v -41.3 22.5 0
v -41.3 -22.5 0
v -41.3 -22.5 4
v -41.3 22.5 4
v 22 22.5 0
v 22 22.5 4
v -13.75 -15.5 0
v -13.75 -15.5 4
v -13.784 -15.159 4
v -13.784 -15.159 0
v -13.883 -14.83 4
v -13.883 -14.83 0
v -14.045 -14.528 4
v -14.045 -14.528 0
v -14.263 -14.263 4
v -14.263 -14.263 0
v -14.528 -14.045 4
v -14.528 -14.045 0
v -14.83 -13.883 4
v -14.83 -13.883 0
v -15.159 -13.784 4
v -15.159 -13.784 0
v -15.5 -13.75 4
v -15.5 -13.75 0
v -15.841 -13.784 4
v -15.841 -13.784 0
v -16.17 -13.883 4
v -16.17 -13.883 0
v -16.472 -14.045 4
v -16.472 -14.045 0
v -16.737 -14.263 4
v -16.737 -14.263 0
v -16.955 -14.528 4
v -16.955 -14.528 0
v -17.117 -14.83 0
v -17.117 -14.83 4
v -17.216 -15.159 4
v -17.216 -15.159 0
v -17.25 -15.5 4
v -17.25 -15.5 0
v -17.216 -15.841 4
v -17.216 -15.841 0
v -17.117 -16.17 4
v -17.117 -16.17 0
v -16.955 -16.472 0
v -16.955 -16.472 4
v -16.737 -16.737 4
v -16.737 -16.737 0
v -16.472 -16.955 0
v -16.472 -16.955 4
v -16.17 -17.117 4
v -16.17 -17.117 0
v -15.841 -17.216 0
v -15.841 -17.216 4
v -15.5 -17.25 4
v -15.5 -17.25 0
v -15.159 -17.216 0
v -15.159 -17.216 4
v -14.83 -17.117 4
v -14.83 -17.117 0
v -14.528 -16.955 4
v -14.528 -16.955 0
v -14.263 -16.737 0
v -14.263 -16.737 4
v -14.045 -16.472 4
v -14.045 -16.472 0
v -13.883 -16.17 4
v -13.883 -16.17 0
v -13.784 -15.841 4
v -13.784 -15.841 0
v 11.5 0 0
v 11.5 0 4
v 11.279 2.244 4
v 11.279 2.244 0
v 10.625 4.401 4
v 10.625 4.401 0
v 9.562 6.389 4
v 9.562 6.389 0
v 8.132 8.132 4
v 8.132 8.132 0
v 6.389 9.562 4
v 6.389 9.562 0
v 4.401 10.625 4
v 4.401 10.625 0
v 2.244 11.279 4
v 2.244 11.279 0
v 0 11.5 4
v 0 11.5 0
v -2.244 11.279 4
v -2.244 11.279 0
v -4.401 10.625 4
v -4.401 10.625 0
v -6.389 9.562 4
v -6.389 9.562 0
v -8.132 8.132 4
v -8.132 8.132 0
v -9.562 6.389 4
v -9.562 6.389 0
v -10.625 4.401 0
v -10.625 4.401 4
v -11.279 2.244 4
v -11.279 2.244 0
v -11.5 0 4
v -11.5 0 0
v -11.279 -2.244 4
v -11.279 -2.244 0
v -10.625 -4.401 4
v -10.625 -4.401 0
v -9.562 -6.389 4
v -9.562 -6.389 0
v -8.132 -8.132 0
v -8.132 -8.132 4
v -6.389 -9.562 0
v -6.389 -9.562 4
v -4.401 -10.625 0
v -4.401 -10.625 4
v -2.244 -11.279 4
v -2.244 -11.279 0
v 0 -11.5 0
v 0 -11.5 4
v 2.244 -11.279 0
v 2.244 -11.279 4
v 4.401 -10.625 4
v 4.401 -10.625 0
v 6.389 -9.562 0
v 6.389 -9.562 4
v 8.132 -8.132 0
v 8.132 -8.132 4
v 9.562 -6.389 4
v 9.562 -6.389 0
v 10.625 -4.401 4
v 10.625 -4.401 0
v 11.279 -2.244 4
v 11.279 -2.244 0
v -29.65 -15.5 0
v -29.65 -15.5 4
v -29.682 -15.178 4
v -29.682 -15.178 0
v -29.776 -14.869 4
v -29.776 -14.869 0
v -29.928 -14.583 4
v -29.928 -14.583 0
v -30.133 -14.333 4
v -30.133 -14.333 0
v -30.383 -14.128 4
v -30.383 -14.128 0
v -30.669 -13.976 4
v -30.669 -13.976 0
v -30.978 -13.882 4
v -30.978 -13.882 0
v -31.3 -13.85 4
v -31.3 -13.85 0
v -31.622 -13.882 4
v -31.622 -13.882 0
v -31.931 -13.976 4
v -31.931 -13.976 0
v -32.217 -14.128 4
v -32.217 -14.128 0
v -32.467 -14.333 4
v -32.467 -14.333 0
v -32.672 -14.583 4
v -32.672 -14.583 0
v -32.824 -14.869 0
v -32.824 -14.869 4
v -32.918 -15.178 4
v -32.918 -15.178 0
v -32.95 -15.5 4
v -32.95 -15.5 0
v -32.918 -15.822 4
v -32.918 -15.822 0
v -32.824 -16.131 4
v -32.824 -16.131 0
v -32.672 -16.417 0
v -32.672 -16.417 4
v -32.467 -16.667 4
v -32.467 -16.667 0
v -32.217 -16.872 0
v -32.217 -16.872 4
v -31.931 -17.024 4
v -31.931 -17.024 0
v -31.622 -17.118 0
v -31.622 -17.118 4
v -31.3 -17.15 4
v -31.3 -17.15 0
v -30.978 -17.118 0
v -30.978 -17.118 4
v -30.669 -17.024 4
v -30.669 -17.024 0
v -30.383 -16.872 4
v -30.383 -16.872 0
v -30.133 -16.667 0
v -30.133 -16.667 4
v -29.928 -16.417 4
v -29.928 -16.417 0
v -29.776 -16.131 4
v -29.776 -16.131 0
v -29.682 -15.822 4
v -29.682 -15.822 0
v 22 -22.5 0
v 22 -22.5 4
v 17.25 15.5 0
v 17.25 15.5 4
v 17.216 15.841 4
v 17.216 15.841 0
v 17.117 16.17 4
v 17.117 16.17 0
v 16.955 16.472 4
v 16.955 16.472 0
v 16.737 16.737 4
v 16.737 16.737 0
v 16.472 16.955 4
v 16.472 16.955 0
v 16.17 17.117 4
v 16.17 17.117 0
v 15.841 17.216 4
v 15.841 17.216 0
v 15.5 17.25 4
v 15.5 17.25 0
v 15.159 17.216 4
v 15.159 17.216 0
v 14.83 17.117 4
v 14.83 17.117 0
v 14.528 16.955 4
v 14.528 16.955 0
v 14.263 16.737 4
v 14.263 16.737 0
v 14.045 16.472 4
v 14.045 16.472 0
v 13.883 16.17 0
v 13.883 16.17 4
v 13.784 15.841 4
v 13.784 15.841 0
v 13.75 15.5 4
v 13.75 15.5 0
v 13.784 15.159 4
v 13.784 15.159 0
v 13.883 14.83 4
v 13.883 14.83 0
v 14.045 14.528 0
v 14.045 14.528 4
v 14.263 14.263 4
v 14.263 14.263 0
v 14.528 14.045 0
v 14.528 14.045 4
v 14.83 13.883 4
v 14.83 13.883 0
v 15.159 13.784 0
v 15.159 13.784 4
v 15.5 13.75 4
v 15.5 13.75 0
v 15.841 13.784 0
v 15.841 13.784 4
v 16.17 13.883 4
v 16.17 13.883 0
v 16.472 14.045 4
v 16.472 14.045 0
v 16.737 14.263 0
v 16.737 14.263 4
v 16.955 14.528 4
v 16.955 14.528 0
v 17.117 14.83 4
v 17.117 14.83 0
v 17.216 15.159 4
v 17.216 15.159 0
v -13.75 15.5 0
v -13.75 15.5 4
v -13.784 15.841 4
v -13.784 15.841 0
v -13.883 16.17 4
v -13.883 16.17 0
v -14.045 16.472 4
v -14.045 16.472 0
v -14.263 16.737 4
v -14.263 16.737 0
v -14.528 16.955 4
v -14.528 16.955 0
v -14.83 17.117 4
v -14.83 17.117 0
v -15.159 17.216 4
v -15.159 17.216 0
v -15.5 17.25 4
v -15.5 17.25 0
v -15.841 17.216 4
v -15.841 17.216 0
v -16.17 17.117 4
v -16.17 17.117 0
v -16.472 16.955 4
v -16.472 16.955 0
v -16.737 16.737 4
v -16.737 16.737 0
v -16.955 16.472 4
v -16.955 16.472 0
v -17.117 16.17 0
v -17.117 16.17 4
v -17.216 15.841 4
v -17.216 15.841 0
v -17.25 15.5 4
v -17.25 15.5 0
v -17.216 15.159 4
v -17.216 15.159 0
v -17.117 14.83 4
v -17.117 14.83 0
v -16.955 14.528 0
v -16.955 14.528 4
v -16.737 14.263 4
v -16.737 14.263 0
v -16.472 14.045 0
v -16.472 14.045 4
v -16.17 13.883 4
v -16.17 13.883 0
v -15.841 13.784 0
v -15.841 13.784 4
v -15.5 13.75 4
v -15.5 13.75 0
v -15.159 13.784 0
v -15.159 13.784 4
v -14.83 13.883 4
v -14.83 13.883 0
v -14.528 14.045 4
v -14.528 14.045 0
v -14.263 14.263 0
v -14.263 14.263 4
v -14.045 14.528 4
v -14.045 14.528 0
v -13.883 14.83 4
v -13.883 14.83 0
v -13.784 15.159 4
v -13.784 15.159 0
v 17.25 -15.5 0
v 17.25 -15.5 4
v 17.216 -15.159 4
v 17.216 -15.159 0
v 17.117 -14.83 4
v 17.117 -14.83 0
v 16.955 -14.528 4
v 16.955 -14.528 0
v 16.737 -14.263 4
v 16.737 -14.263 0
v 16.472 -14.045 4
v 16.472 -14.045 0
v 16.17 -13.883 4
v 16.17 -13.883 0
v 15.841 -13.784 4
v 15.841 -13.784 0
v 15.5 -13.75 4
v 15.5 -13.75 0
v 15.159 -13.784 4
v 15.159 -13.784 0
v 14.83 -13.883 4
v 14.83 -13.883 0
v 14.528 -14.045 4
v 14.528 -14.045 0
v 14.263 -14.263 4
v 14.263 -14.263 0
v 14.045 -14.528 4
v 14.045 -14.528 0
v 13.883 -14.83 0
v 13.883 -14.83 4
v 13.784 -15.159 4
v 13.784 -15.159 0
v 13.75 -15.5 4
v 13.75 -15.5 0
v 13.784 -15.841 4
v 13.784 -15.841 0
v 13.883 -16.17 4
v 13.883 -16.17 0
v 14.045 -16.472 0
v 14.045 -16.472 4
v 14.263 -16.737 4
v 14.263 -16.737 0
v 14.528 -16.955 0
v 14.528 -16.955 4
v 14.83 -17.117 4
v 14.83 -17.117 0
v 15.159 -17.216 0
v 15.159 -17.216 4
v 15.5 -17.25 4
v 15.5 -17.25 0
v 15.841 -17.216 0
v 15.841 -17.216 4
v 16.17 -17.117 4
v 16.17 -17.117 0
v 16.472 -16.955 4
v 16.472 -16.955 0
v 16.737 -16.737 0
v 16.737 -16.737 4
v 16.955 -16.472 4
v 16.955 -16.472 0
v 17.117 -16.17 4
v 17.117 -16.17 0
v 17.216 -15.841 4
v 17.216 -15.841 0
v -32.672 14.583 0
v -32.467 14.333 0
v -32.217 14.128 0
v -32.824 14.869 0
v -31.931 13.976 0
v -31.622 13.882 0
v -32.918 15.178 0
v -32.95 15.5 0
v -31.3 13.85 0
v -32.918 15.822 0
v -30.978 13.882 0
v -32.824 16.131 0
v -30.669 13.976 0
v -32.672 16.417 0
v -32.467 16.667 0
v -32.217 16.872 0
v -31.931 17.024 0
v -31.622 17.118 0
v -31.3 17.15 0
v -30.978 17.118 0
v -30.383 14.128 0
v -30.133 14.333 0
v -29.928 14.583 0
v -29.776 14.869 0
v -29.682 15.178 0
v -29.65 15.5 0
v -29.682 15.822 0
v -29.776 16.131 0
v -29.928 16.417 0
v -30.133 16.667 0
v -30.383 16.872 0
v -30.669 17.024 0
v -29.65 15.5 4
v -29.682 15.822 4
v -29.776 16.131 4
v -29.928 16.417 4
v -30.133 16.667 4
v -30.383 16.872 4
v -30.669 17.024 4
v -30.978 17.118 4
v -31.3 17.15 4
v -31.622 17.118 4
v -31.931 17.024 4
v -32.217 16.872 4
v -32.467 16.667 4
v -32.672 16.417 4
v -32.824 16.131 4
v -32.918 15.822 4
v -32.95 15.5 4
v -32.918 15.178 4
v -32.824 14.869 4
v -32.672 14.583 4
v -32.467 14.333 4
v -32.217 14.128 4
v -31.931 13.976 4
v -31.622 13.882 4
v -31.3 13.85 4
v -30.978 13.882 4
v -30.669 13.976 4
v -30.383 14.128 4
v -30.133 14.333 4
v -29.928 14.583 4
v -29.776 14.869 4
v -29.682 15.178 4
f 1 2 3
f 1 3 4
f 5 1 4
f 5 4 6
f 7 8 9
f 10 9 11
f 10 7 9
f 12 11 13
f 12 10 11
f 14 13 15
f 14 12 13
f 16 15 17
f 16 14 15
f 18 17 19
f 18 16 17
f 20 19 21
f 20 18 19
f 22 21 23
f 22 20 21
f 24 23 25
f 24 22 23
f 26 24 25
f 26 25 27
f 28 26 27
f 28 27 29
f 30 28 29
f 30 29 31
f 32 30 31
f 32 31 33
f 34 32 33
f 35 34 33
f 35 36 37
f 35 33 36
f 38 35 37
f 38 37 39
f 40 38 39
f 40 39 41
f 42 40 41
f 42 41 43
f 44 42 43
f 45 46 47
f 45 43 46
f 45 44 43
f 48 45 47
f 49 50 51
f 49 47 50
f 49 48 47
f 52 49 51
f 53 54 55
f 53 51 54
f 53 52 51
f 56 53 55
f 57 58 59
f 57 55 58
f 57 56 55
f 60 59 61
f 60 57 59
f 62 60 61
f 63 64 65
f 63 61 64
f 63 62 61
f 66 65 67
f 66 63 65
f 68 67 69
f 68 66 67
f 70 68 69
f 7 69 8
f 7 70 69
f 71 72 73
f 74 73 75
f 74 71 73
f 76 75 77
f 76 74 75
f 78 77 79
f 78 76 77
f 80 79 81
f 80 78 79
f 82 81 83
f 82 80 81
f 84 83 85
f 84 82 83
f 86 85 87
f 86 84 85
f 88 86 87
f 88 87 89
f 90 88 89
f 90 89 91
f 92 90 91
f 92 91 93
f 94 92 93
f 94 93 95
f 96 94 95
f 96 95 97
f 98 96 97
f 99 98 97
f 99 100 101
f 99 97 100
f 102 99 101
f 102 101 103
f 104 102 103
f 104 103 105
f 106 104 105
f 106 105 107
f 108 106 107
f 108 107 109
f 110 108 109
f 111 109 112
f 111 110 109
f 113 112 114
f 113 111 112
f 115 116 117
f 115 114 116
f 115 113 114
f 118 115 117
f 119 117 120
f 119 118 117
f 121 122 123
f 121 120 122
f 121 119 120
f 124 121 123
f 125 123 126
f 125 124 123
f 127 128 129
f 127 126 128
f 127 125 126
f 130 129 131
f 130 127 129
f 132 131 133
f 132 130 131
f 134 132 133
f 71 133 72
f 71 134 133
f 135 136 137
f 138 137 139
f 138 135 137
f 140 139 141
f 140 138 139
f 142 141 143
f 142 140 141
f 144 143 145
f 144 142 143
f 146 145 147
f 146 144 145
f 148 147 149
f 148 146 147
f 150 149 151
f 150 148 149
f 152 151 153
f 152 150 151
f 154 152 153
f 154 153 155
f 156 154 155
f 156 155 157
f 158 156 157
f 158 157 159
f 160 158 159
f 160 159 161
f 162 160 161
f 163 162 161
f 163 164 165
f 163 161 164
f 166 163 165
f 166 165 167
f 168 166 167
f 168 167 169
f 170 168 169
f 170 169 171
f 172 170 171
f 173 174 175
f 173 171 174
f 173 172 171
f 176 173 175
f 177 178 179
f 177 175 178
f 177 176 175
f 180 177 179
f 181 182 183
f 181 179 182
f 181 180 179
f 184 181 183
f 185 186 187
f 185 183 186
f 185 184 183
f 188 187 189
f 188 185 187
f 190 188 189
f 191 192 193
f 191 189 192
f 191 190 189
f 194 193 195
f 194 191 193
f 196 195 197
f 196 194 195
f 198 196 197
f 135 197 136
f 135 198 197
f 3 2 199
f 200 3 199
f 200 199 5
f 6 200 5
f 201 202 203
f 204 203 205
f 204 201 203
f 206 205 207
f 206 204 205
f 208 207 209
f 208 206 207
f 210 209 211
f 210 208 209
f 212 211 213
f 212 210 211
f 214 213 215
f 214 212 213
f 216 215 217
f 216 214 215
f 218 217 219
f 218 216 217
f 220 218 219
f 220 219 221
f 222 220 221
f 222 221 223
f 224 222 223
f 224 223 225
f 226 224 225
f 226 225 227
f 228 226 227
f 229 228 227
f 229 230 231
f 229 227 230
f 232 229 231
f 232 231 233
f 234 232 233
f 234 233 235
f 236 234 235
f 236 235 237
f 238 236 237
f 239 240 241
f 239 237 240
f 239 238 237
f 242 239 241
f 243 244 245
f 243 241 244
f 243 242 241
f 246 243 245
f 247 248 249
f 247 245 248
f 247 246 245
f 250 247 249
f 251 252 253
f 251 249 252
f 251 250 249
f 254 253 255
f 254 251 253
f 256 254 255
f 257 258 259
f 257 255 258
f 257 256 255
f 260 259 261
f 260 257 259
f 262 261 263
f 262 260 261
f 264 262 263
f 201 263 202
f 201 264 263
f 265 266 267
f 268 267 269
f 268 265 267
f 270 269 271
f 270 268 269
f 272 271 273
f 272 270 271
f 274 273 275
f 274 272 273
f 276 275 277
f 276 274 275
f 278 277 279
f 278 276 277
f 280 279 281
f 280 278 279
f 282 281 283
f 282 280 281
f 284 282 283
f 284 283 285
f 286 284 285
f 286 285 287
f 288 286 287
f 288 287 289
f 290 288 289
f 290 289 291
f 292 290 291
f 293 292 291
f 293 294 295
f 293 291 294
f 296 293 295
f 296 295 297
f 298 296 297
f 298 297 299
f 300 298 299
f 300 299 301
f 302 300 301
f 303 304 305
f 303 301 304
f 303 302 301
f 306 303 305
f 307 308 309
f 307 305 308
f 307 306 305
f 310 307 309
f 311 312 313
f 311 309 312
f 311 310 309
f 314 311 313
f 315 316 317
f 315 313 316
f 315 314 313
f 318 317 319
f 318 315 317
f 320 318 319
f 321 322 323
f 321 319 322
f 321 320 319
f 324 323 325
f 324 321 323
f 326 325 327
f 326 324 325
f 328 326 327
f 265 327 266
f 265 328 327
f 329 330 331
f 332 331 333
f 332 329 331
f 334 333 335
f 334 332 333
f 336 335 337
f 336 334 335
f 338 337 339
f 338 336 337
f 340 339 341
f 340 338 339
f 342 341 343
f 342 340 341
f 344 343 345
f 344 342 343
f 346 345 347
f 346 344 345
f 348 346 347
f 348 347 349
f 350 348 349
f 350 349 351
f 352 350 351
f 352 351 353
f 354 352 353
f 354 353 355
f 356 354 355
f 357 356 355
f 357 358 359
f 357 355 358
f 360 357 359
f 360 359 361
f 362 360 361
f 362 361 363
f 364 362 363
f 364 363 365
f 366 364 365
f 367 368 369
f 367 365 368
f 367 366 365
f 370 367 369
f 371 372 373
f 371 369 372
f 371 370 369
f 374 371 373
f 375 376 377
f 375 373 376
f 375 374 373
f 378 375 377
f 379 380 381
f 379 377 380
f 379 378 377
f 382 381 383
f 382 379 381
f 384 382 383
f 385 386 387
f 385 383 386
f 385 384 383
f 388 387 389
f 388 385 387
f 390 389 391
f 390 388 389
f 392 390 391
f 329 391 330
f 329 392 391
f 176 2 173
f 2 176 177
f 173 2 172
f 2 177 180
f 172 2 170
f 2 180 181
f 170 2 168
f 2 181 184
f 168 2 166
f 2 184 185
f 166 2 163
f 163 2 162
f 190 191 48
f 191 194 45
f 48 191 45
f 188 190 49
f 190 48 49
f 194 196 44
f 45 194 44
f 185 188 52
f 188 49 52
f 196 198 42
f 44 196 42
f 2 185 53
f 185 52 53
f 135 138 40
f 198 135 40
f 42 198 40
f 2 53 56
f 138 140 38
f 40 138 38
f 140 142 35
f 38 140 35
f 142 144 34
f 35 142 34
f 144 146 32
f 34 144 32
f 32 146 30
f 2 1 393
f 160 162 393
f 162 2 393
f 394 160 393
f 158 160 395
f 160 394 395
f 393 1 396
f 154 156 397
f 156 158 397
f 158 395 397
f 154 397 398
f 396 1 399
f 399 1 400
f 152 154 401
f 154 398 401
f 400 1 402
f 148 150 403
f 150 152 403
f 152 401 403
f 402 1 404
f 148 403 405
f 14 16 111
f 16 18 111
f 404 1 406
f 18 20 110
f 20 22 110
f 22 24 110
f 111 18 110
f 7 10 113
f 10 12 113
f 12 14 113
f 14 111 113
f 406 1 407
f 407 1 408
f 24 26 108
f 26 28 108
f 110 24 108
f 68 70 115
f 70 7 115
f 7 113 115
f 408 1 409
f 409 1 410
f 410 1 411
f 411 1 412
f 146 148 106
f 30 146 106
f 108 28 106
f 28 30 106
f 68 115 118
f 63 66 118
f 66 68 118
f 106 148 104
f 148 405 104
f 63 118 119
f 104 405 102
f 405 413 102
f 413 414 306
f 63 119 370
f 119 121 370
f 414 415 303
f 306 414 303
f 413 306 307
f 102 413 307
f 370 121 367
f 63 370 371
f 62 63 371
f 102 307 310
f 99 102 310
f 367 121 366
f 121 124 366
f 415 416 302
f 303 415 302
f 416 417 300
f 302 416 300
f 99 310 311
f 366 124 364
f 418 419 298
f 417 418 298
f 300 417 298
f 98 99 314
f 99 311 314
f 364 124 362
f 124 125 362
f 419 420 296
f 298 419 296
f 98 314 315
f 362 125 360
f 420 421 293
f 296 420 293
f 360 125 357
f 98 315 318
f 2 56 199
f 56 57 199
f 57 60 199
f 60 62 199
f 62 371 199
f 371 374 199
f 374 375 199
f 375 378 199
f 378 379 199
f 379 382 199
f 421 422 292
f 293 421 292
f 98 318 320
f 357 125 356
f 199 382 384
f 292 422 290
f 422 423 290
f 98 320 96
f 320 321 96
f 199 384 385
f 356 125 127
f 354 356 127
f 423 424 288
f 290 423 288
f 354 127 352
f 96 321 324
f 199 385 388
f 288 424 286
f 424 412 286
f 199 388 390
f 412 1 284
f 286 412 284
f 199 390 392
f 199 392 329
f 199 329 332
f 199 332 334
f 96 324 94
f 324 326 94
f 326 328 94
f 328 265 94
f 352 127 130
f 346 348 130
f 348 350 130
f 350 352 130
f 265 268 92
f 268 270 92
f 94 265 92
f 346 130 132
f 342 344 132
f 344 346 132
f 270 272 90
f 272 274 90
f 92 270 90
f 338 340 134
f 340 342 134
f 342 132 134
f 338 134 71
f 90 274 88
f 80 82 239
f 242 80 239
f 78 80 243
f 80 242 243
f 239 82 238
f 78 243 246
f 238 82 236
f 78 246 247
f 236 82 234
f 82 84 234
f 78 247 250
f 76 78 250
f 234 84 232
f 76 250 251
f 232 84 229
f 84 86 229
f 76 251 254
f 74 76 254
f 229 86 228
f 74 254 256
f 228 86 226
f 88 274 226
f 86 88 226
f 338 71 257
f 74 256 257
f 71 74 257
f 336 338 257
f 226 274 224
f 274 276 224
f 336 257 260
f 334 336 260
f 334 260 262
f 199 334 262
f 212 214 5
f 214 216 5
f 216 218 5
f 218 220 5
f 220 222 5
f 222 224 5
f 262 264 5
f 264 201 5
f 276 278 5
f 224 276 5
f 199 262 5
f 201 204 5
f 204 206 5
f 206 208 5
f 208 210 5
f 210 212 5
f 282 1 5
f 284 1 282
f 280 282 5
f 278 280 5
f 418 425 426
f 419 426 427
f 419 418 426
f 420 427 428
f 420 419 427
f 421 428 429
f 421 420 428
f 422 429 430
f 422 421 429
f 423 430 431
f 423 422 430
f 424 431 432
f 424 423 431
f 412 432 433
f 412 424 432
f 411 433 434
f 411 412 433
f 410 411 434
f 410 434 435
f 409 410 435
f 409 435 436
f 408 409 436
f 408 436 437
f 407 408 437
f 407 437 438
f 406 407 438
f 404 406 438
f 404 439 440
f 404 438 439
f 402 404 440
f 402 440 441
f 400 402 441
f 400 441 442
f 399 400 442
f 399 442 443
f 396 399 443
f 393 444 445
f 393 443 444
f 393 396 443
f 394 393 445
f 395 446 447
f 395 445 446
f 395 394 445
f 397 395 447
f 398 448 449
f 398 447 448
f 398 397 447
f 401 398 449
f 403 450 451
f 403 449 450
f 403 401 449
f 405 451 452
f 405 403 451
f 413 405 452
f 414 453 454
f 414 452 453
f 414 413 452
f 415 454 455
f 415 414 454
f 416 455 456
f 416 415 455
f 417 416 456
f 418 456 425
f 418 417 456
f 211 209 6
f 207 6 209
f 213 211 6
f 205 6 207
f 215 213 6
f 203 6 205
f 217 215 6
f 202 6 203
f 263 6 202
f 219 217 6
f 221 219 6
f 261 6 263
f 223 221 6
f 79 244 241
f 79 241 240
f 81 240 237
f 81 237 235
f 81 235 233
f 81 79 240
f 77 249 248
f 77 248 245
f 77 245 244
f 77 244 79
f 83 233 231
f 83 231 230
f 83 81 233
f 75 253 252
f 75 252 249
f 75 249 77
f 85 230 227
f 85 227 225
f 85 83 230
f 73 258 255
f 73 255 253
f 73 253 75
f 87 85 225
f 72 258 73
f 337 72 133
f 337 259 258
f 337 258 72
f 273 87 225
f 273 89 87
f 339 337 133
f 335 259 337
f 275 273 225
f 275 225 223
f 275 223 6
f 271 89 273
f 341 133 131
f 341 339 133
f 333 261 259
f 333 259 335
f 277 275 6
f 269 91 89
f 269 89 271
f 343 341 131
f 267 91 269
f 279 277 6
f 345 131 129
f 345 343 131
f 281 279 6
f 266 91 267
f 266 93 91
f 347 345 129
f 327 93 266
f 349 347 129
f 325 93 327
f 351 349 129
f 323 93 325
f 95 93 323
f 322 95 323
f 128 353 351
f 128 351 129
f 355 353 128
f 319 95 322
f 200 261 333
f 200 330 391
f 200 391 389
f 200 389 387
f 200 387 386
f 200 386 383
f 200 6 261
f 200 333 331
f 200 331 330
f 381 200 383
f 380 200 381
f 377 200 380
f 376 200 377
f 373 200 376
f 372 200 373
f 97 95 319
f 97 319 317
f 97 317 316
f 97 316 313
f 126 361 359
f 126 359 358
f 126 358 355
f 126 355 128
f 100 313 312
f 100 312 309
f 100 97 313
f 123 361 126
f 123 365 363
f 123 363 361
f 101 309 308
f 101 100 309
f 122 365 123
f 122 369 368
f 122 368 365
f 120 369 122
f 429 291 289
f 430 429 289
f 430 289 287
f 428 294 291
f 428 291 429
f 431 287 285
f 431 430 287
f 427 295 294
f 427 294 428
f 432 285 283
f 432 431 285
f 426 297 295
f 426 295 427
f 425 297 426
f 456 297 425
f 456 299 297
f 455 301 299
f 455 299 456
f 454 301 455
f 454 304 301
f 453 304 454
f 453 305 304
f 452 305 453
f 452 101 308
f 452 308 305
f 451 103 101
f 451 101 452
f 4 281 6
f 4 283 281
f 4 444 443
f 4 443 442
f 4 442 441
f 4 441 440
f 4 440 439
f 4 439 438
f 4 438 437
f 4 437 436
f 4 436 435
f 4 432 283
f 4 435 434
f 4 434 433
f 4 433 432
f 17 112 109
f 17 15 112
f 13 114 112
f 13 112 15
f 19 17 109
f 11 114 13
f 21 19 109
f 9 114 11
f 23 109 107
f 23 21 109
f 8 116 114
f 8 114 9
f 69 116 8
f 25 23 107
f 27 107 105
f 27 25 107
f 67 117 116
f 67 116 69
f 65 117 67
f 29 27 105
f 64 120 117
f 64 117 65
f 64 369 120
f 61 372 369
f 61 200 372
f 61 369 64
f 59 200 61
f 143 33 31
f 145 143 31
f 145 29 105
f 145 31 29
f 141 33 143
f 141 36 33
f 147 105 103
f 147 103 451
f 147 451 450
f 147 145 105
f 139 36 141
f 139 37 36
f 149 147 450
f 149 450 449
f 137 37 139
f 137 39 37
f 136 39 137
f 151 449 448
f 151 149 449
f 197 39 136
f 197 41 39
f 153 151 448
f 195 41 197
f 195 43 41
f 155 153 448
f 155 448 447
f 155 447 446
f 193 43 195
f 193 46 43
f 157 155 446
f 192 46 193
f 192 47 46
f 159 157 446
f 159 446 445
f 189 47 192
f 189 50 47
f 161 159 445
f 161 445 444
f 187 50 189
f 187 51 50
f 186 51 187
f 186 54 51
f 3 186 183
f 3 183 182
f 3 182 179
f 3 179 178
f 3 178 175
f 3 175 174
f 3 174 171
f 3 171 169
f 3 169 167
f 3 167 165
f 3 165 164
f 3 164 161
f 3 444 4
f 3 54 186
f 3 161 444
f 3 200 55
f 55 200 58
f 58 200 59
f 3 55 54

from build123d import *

# Parameters (mm, degrees)
ESBO_O1_W                  = 63.3
ESBO_O1_H                  = 45
ESBO_O1_R                  = 11.5
ESBO_O1_R_2                = 1.75
ESBO_O1_R_3                = 1.65
RESSALTO_EXTRUS_O1_DEPTH   = 25
CORTE_EXTRUS_O1_DEPTH      = 54.262932702
CORTE_EXTRUS_O1_DEPTH_BACK = 54.262932702
ESBO_O2_W                  = 13.3
ESBO_O2_H                  = 21


with BuildPart() as part:
    # Esboço1 → Ressalto-extrusão1 (new body)
    with BuildSketch(Plane.XY):
        with Locations((-9.65, 0)):
            Rectangle(ESBO_O1_W, ESBO_O1_H)
        Circle(ESBO_O1_R, mode=Mode.SUBTRACT)
        with Locations((-15.5, 15.5)):
            Circle(ESBO_O1_R_2, mode=Mode.SUBTRACT)
        with Locations((15.5, 15.5)):
            Circle(ESBO_O1_R_2, mode=Mode.SUBTRACT)
        with Locations((15.5, -15.5)):
            Circle(ESBO_O1_R_2, mode=Mode.SUBTRACT)
        with Locations((-15.5, -15.5)):
            Circle(ESBO_O1_R_2, mode=Mode.SUBTRACT)
        with Locations((-31.3, -15.5)):
            Circle(ESBO_O1_R_3, mode=Mode.SUBTRACT)
        with Locations((-31.3, 15.5)):
            Circle(ESBO_O1_R_3, mode=Mode.SUBTRACT)
    extrude(amount=RESSALTO_EXTRUS_O1_DEPTH)

    # Esboço2 → Corte-extrusão1 (cut, two sides: drawn at the far end of the back side and taken through both)
    with BuildSketch(Plane(origin=(0, 0, 0), x_dir=(1, 0, 0), z_dir=(0, 1, 0)).offset(-CORTE_EXTRUS_O1_DEPTH_BACK)):
        with Locations((-34.65, -14.5)):
            Rectangle(ESBO_O2_W, ESBO_O2_H)
        Polygon((-23, -25), (22, -25), (22, -4), align=None)
        Polygon((-23, -25), (22, -4), (-23, -4), (-28, -4), (-28, -25), align=None)
    extrude(amount=CORTE_EXTRUS_O1_DEPTH + CORTE_EXTRUS_O1_DEPTH_BACK, mode=Mode.SUBTRACT)


solid = part.part
